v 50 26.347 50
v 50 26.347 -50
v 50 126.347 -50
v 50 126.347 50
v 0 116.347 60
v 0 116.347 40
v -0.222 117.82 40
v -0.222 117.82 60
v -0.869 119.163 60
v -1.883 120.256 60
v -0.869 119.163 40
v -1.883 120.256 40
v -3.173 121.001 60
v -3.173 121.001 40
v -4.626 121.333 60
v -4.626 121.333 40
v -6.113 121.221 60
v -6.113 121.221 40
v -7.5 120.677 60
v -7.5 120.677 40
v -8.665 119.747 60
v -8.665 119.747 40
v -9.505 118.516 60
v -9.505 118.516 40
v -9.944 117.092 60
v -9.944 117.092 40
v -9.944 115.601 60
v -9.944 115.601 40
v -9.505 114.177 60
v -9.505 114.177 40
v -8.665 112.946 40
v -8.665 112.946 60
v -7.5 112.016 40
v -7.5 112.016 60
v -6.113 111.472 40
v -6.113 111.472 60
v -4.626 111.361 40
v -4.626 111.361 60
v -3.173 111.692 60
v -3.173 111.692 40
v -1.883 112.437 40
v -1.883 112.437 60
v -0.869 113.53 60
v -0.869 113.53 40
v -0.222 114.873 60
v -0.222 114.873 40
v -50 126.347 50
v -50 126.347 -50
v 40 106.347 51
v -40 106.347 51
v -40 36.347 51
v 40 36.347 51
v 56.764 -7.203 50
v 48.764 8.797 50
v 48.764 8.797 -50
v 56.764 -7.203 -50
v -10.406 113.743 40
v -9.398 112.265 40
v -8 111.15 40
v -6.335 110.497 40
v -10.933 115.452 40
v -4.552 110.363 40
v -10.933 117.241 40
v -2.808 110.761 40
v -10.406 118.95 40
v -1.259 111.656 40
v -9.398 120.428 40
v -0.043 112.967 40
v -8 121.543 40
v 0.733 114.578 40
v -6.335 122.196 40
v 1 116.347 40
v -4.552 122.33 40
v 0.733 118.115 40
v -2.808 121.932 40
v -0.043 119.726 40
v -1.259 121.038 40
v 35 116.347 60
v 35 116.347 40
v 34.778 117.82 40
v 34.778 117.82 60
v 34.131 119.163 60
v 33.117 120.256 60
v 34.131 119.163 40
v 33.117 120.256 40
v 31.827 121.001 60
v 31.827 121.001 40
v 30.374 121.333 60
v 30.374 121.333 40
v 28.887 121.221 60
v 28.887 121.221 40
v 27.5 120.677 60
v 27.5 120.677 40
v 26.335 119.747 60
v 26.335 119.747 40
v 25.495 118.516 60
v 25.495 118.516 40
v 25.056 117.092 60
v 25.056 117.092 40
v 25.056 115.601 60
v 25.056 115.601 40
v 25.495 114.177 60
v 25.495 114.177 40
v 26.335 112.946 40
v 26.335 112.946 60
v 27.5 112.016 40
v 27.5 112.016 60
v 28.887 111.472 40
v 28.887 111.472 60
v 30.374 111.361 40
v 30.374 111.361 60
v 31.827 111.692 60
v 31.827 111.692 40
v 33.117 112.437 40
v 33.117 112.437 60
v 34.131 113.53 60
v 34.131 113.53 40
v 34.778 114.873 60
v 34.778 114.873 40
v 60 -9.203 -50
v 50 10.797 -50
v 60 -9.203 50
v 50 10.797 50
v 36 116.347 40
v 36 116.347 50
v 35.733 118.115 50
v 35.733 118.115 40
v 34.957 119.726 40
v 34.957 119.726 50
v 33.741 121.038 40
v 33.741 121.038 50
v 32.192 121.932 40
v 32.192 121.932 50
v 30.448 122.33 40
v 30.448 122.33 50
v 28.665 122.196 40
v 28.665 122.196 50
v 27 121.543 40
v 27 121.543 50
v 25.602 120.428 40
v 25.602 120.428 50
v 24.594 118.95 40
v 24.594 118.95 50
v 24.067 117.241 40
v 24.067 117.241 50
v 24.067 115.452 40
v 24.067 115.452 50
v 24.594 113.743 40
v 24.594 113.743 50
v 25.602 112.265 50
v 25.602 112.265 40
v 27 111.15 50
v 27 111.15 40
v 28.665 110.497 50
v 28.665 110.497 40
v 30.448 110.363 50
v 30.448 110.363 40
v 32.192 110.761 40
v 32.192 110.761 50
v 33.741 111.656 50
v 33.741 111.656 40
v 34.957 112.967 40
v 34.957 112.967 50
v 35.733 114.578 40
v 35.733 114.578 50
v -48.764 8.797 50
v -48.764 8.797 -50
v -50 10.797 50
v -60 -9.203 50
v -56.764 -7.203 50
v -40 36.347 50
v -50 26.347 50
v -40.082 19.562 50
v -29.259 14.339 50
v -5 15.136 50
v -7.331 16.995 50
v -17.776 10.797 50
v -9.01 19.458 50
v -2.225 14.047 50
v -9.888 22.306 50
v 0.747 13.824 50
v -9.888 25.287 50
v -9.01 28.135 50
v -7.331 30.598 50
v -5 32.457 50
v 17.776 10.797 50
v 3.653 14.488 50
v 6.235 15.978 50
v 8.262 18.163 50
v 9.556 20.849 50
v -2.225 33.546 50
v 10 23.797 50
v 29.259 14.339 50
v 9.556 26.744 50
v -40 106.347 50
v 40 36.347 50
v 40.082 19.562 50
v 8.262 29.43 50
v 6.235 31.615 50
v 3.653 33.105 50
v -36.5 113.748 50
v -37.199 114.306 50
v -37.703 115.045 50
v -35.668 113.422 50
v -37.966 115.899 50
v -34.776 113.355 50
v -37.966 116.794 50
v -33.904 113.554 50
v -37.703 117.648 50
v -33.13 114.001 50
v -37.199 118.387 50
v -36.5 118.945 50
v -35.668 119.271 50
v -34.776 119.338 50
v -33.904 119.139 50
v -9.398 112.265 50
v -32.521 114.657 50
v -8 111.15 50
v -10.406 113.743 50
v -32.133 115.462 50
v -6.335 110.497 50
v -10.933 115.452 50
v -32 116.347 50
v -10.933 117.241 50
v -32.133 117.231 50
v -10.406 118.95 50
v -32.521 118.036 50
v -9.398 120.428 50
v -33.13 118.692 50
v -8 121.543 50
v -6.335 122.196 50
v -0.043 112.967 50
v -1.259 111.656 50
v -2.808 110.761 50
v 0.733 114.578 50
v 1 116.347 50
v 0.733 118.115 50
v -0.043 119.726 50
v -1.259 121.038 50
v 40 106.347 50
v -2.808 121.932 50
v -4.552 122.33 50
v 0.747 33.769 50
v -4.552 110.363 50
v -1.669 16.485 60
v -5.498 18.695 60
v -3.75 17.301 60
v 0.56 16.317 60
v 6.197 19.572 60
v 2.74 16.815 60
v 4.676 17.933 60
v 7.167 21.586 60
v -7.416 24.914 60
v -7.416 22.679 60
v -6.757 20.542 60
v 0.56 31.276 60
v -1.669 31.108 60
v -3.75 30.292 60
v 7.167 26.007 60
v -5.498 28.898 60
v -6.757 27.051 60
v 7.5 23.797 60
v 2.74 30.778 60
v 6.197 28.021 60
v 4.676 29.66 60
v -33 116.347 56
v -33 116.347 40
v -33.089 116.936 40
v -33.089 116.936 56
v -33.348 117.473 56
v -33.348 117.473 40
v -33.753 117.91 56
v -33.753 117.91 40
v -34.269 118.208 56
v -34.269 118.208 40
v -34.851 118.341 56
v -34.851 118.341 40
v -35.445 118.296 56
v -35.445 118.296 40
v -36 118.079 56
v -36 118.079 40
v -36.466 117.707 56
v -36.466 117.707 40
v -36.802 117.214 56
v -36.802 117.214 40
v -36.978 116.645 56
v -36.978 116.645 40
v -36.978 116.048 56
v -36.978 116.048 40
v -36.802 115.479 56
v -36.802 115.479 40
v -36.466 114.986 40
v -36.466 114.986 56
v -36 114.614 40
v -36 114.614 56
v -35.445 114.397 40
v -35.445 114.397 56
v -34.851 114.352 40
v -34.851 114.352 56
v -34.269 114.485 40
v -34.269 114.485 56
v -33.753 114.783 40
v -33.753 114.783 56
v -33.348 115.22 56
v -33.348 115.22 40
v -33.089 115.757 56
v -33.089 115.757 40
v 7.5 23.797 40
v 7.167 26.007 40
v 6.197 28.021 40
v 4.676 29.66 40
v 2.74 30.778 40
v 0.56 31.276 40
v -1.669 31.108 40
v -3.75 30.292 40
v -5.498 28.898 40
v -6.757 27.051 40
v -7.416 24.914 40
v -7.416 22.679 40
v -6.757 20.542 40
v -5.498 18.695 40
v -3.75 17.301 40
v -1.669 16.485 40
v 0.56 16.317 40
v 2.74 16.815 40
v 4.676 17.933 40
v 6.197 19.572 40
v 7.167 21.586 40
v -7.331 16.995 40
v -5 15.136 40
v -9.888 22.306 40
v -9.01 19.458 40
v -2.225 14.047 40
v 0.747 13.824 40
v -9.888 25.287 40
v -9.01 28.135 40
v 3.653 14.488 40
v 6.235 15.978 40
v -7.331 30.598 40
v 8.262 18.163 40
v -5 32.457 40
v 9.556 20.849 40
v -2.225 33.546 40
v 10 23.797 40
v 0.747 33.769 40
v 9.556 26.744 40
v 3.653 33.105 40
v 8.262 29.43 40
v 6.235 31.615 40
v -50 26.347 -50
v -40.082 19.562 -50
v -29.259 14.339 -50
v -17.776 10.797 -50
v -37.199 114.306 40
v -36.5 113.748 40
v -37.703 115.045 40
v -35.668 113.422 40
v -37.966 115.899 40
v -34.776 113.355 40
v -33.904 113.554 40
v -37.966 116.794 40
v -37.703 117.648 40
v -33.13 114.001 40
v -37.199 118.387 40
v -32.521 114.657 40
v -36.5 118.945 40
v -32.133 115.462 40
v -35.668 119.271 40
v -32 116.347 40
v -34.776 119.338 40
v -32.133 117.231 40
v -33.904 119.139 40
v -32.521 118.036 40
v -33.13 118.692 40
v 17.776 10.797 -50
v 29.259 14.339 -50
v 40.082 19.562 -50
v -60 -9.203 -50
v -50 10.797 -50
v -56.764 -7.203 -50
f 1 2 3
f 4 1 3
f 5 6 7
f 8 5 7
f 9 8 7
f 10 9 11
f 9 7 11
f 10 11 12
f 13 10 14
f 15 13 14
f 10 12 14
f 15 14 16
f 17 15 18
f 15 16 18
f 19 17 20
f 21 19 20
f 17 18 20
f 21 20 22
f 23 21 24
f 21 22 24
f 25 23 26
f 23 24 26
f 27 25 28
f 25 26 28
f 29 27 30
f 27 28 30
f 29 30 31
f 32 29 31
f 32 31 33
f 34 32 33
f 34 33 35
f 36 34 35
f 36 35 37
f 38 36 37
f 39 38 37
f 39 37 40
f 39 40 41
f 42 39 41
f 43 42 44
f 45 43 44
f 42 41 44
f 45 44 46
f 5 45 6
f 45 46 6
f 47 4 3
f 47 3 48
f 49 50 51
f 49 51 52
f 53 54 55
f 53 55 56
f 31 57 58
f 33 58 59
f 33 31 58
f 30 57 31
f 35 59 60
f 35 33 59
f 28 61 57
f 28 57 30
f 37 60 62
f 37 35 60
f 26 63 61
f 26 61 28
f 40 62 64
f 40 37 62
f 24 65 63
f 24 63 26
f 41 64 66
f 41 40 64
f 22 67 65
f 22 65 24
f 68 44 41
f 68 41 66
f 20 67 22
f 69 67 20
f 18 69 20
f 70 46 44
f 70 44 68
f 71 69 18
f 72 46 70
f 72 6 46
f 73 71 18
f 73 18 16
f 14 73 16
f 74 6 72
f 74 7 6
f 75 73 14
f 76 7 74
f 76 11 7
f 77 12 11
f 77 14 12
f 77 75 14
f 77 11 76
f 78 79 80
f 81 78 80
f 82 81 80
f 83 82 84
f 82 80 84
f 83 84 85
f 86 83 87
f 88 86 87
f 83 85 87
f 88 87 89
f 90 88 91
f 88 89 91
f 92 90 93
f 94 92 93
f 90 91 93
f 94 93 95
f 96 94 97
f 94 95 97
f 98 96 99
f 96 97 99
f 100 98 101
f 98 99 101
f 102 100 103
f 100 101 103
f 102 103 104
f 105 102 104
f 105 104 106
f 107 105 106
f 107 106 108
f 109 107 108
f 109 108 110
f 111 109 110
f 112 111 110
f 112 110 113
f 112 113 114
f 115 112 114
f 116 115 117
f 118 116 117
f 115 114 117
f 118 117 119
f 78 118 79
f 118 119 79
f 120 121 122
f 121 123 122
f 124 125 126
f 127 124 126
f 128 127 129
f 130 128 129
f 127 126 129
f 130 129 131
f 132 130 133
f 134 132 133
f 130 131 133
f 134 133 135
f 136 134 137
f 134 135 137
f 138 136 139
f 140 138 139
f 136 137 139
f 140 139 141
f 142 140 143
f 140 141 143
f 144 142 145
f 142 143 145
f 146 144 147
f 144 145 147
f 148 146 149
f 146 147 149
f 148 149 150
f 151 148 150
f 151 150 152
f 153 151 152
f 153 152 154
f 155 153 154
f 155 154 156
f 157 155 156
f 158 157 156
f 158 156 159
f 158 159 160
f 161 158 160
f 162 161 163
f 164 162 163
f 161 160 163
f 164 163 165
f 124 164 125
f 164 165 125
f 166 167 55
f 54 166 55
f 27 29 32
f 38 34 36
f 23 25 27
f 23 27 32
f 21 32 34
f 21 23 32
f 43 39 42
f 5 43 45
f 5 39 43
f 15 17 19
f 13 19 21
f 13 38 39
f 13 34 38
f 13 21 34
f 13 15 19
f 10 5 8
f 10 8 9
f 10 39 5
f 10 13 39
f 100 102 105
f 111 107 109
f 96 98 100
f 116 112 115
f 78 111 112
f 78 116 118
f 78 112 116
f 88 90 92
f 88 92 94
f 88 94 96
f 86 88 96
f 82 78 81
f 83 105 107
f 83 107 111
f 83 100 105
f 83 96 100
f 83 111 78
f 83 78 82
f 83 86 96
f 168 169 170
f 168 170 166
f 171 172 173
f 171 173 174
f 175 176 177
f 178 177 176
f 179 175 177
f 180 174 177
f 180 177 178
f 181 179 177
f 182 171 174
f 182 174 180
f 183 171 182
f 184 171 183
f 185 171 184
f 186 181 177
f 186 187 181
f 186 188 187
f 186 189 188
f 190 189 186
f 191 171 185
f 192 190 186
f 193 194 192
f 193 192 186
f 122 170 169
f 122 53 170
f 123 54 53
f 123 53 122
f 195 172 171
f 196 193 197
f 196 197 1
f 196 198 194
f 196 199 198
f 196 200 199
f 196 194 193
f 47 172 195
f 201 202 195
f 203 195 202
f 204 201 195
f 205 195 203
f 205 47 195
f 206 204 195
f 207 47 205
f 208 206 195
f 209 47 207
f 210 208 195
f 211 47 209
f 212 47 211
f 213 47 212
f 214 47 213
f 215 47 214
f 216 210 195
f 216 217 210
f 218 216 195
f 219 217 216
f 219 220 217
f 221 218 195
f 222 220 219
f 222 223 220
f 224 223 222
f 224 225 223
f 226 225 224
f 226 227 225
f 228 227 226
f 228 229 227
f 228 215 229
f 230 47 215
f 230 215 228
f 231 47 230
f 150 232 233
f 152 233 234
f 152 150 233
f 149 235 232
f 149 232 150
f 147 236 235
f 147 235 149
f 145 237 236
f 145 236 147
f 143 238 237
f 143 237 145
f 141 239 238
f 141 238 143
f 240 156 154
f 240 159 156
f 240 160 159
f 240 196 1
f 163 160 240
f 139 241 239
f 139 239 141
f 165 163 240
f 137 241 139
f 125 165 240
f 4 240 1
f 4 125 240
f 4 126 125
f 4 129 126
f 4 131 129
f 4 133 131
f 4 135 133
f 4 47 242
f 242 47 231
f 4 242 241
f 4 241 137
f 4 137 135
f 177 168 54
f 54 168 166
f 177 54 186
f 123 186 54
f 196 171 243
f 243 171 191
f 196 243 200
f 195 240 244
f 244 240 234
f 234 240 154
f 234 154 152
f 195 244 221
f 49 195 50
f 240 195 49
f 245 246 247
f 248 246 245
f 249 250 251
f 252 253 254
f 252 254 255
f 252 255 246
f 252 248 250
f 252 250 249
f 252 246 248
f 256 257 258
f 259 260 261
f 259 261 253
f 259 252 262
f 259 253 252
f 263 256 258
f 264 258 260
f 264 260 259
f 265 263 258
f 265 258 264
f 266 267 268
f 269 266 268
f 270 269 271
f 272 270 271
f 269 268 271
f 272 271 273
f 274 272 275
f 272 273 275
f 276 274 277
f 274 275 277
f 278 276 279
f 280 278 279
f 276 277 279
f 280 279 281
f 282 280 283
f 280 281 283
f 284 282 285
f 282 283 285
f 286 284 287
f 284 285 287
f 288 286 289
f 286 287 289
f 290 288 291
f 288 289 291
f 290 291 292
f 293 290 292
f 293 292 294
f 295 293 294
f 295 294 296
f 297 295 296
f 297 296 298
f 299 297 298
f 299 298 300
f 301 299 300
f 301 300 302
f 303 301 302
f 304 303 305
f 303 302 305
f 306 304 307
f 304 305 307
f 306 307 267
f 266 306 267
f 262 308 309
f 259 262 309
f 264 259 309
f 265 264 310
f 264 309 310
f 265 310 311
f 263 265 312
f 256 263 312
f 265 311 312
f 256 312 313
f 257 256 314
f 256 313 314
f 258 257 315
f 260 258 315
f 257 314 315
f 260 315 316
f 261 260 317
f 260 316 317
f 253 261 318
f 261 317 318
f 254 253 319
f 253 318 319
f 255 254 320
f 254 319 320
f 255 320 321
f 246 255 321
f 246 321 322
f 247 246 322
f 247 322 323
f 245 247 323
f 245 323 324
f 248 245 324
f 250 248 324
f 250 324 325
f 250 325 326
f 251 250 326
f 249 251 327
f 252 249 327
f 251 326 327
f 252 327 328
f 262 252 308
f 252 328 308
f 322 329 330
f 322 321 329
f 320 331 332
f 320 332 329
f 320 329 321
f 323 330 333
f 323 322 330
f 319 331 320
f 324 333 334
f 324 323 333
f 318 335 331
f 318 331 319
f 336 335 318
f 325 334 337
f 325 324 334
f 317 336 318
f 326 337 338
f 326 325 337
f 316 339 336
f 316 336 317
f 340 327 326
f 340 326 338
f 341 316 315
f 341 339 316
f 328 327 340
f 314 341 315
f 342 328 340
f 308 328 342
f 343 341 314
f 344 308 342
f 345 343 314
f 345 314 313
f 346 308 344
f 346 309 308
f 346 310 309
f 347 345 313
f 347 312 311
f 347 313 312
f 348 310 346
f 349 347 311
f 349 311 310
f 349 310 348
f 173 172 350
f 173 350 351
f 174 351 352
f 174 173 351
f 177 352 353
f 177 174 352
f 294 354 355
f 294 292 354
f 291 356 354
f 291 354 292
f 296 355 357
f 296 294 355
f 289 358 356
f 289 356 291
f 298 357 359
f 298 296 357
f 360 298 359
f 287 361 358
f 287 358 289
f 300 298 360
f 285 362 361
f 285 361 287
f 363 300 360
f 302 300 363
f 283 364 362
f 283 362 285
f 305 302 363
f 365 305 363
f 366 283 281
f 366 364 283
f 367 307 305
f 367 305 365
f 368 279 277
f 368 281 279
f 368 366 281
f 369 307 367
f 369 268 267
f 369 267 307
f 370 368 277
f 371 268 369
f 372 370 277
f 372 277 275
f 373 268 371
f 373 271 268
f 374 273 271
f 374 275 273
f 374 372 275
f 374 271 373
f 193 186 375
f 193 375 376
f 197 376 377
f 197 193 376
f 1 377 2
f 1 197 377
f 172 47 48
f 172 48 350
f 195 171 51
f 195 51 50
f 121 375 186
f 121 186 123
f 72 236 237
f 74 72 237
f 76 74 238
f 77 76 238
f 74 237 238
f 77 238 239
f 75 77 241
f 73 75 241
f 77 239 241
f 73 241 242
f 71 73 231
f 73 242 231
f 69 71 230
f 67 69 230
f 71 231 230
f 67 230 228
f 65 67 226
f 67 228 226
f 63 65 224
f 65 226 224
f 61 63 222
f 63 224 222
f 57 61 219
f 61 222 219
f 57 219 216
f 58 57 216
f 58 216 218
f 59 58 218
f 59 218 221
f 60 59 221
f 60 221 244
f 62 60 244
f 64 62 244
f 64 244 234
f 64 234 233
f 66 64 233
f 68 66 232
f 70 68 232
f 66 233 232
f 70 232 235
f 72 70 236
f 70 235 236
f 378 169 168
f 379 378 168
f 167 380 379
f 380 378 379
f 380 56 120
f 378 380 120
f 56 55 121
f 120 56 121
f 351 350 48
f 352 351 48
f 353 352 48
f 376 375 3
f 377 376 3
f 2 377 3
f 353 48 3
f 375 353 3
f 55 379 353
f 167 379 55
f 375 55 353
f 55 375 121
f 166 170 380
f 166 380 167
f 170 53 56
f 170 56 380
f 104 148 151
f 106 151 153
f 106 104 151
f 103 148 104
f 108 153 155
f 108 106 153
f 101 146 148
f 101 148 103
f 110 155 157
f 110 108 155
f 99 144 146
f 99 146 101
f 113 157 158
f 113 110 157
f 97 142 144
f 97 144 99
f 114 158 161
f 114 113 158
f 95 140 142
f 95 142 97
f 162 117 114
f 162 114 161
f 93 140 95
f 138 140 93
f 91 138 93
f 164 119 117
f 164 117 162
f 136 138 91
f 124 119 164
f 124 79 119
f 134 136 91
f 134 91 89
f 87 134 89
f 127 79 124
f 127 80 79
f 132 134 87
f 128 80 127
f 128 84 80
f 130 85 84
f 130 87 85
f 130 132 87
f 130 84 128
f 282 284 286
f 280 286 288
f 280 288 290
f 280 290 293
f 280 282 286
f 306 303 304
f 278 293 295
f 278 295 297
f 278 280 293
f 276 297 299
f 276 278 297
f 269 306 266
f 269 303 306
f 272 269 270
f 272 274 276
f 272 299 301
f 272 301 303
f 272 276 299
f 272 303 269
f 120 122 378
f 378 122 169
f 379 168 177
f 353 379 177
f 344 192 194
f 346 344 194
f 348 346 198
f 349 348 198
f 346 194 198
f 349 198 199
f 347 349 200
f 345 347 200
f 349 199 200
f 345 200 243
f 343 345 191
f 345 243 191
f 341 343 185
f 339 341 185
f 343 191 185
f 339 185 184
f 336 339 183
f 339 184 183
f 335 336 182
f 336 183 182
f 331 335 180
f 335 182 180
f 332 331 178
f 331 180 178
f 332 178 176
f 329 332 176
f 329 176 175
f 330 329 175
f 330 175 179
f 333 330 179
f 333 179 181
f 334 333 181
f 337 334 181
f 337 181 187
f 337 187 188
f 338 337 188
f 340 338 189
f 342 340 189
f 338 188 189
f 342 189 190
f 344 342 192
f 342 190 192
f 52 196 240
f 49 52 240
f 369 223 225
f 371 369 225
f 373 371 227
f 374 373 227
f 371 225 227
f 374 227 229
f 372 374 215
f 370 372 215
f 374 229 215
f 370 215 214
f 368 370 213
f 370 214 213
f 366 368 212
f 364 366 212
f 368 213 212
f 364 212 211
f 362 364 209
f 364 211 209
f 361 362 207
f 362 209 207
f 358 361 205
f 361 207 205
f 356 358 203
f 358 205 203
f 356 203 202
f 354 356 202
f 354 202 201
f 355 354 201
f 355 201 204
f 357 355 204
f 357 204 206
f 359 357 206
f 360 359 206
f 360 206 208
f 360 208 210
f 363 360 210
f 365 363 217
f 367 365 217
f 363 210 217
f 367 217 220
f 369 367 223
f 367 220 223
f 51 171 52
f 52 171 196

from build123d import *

# Parameters (mm, degrees)
EXTRUDE_1_DEPTH     = 50
EXTRUDE_1_2_DEPTH   = 50
SKETCH_3_W          = 80
SKETCH_3_H          = 70
EXTRUDE_2_DEPTH     = 1
SKETCH_4_R          = 3
SKETCH_4_R_2        = 6
SKETCH_4_R_3        = 10
CUT_EXTRUDE_1_DEPTH = 10
SKETCH_5_R          = 7.5
SKETCH_5_R_2        = 5
EXTRUDE_3_DEPTH     = 20
SKETCH_6_R          = 2
EXTRUDE_4_DEPTH     = 16


with BuildPart() as part:
    # 草图1 → Extrude 1 (new, symmetric)
    with BuildSketch(Plane.XY):
        Polygon((-50, 10.796505179), (50, 10.796505179), (60, -9.203494821), (-60, -9.203494821), align=None)
        Polygon((-48.763932023, 8.796505179), (48.763932023, 8.796505179), (56.763932023, -7.203494821), (-56.763932023, -7.203494821), align=None, mode=Mode.SUBTRACT)
    extrude(amount=EXTRUDE_1_DEPTH, both=True)

    # 草图2 → Extrude 1 2 (add, symmetric)
    with BuildSketch(Plane.XY):
        with BuildLine():
            Line((50, 26.346525195), (50, 126.346525195))
            Line((50, 126.346525195), (-50, 126.346525195))
            Line((-50, 126.346525195), (-50, 26.346525195))
            ThreePointArc((-50, 26.346525195), (0, 8.796505179), (50, 26.346525195))
        make_face()
    extrude(amount=EXTRUDE_1_2_DEPTH, both=True)

    # 草图3 → 凸台-拉伸2 (add)
    with BuildSketch(Plane.XY.offset(50)):
        with Locations((0, 71.346525195)):
            Rectangle(SKETCH_3_W, SKETCH_3_H)
    extrude(amount=EXTRUDE_2_DEPTH)

    # 草图4 → 切除-拉伸1 (cut)
    with BuildSketch(Plane.XY.offset(50)):
        with Locations((-35, 116.346525195)):
            Circle(SKETCH_4_R)
        with Locations((-5, 116.346525195)):
            Circle(SKETCH_4_R_2)
        with Locations((30, 116.346525195)):
            Circle(SKETCH_4_R_2)
        with Locations((0, 23.796505179)):
            Circle(SKETCH_4_R_3)
    extrude(amount=-CUT_EXTRUDE_1_DEPTH, mode=Mode.SUBTRACT)

    # 草图5 → 凸台-拉伸3 (add)
    with BuildSketch(Plane.XY.offset(40)):
        with Locations((0, 23.796505179)):
            Circle(SKETCH_5_R)
        with Locations((-5, 116.346525195)):
            Circle(SKETCH_5_R_2)
        with Locations((30, 116.346525195)):
            Circle(SKETCH_5_R_2)
    extrude(amount=EXTRUDE_3_DEPTH)

    # 草图6 → 凸台-拉伸4 (add)
    with BuildSketch(Plane.XY.offset(40)):
        with Locations((-35, 116.346525195)):
            Circle(SKETCH_6_R)
    extrude(amount=EXTRUDE_4_DEPTH)


solid = part.part
